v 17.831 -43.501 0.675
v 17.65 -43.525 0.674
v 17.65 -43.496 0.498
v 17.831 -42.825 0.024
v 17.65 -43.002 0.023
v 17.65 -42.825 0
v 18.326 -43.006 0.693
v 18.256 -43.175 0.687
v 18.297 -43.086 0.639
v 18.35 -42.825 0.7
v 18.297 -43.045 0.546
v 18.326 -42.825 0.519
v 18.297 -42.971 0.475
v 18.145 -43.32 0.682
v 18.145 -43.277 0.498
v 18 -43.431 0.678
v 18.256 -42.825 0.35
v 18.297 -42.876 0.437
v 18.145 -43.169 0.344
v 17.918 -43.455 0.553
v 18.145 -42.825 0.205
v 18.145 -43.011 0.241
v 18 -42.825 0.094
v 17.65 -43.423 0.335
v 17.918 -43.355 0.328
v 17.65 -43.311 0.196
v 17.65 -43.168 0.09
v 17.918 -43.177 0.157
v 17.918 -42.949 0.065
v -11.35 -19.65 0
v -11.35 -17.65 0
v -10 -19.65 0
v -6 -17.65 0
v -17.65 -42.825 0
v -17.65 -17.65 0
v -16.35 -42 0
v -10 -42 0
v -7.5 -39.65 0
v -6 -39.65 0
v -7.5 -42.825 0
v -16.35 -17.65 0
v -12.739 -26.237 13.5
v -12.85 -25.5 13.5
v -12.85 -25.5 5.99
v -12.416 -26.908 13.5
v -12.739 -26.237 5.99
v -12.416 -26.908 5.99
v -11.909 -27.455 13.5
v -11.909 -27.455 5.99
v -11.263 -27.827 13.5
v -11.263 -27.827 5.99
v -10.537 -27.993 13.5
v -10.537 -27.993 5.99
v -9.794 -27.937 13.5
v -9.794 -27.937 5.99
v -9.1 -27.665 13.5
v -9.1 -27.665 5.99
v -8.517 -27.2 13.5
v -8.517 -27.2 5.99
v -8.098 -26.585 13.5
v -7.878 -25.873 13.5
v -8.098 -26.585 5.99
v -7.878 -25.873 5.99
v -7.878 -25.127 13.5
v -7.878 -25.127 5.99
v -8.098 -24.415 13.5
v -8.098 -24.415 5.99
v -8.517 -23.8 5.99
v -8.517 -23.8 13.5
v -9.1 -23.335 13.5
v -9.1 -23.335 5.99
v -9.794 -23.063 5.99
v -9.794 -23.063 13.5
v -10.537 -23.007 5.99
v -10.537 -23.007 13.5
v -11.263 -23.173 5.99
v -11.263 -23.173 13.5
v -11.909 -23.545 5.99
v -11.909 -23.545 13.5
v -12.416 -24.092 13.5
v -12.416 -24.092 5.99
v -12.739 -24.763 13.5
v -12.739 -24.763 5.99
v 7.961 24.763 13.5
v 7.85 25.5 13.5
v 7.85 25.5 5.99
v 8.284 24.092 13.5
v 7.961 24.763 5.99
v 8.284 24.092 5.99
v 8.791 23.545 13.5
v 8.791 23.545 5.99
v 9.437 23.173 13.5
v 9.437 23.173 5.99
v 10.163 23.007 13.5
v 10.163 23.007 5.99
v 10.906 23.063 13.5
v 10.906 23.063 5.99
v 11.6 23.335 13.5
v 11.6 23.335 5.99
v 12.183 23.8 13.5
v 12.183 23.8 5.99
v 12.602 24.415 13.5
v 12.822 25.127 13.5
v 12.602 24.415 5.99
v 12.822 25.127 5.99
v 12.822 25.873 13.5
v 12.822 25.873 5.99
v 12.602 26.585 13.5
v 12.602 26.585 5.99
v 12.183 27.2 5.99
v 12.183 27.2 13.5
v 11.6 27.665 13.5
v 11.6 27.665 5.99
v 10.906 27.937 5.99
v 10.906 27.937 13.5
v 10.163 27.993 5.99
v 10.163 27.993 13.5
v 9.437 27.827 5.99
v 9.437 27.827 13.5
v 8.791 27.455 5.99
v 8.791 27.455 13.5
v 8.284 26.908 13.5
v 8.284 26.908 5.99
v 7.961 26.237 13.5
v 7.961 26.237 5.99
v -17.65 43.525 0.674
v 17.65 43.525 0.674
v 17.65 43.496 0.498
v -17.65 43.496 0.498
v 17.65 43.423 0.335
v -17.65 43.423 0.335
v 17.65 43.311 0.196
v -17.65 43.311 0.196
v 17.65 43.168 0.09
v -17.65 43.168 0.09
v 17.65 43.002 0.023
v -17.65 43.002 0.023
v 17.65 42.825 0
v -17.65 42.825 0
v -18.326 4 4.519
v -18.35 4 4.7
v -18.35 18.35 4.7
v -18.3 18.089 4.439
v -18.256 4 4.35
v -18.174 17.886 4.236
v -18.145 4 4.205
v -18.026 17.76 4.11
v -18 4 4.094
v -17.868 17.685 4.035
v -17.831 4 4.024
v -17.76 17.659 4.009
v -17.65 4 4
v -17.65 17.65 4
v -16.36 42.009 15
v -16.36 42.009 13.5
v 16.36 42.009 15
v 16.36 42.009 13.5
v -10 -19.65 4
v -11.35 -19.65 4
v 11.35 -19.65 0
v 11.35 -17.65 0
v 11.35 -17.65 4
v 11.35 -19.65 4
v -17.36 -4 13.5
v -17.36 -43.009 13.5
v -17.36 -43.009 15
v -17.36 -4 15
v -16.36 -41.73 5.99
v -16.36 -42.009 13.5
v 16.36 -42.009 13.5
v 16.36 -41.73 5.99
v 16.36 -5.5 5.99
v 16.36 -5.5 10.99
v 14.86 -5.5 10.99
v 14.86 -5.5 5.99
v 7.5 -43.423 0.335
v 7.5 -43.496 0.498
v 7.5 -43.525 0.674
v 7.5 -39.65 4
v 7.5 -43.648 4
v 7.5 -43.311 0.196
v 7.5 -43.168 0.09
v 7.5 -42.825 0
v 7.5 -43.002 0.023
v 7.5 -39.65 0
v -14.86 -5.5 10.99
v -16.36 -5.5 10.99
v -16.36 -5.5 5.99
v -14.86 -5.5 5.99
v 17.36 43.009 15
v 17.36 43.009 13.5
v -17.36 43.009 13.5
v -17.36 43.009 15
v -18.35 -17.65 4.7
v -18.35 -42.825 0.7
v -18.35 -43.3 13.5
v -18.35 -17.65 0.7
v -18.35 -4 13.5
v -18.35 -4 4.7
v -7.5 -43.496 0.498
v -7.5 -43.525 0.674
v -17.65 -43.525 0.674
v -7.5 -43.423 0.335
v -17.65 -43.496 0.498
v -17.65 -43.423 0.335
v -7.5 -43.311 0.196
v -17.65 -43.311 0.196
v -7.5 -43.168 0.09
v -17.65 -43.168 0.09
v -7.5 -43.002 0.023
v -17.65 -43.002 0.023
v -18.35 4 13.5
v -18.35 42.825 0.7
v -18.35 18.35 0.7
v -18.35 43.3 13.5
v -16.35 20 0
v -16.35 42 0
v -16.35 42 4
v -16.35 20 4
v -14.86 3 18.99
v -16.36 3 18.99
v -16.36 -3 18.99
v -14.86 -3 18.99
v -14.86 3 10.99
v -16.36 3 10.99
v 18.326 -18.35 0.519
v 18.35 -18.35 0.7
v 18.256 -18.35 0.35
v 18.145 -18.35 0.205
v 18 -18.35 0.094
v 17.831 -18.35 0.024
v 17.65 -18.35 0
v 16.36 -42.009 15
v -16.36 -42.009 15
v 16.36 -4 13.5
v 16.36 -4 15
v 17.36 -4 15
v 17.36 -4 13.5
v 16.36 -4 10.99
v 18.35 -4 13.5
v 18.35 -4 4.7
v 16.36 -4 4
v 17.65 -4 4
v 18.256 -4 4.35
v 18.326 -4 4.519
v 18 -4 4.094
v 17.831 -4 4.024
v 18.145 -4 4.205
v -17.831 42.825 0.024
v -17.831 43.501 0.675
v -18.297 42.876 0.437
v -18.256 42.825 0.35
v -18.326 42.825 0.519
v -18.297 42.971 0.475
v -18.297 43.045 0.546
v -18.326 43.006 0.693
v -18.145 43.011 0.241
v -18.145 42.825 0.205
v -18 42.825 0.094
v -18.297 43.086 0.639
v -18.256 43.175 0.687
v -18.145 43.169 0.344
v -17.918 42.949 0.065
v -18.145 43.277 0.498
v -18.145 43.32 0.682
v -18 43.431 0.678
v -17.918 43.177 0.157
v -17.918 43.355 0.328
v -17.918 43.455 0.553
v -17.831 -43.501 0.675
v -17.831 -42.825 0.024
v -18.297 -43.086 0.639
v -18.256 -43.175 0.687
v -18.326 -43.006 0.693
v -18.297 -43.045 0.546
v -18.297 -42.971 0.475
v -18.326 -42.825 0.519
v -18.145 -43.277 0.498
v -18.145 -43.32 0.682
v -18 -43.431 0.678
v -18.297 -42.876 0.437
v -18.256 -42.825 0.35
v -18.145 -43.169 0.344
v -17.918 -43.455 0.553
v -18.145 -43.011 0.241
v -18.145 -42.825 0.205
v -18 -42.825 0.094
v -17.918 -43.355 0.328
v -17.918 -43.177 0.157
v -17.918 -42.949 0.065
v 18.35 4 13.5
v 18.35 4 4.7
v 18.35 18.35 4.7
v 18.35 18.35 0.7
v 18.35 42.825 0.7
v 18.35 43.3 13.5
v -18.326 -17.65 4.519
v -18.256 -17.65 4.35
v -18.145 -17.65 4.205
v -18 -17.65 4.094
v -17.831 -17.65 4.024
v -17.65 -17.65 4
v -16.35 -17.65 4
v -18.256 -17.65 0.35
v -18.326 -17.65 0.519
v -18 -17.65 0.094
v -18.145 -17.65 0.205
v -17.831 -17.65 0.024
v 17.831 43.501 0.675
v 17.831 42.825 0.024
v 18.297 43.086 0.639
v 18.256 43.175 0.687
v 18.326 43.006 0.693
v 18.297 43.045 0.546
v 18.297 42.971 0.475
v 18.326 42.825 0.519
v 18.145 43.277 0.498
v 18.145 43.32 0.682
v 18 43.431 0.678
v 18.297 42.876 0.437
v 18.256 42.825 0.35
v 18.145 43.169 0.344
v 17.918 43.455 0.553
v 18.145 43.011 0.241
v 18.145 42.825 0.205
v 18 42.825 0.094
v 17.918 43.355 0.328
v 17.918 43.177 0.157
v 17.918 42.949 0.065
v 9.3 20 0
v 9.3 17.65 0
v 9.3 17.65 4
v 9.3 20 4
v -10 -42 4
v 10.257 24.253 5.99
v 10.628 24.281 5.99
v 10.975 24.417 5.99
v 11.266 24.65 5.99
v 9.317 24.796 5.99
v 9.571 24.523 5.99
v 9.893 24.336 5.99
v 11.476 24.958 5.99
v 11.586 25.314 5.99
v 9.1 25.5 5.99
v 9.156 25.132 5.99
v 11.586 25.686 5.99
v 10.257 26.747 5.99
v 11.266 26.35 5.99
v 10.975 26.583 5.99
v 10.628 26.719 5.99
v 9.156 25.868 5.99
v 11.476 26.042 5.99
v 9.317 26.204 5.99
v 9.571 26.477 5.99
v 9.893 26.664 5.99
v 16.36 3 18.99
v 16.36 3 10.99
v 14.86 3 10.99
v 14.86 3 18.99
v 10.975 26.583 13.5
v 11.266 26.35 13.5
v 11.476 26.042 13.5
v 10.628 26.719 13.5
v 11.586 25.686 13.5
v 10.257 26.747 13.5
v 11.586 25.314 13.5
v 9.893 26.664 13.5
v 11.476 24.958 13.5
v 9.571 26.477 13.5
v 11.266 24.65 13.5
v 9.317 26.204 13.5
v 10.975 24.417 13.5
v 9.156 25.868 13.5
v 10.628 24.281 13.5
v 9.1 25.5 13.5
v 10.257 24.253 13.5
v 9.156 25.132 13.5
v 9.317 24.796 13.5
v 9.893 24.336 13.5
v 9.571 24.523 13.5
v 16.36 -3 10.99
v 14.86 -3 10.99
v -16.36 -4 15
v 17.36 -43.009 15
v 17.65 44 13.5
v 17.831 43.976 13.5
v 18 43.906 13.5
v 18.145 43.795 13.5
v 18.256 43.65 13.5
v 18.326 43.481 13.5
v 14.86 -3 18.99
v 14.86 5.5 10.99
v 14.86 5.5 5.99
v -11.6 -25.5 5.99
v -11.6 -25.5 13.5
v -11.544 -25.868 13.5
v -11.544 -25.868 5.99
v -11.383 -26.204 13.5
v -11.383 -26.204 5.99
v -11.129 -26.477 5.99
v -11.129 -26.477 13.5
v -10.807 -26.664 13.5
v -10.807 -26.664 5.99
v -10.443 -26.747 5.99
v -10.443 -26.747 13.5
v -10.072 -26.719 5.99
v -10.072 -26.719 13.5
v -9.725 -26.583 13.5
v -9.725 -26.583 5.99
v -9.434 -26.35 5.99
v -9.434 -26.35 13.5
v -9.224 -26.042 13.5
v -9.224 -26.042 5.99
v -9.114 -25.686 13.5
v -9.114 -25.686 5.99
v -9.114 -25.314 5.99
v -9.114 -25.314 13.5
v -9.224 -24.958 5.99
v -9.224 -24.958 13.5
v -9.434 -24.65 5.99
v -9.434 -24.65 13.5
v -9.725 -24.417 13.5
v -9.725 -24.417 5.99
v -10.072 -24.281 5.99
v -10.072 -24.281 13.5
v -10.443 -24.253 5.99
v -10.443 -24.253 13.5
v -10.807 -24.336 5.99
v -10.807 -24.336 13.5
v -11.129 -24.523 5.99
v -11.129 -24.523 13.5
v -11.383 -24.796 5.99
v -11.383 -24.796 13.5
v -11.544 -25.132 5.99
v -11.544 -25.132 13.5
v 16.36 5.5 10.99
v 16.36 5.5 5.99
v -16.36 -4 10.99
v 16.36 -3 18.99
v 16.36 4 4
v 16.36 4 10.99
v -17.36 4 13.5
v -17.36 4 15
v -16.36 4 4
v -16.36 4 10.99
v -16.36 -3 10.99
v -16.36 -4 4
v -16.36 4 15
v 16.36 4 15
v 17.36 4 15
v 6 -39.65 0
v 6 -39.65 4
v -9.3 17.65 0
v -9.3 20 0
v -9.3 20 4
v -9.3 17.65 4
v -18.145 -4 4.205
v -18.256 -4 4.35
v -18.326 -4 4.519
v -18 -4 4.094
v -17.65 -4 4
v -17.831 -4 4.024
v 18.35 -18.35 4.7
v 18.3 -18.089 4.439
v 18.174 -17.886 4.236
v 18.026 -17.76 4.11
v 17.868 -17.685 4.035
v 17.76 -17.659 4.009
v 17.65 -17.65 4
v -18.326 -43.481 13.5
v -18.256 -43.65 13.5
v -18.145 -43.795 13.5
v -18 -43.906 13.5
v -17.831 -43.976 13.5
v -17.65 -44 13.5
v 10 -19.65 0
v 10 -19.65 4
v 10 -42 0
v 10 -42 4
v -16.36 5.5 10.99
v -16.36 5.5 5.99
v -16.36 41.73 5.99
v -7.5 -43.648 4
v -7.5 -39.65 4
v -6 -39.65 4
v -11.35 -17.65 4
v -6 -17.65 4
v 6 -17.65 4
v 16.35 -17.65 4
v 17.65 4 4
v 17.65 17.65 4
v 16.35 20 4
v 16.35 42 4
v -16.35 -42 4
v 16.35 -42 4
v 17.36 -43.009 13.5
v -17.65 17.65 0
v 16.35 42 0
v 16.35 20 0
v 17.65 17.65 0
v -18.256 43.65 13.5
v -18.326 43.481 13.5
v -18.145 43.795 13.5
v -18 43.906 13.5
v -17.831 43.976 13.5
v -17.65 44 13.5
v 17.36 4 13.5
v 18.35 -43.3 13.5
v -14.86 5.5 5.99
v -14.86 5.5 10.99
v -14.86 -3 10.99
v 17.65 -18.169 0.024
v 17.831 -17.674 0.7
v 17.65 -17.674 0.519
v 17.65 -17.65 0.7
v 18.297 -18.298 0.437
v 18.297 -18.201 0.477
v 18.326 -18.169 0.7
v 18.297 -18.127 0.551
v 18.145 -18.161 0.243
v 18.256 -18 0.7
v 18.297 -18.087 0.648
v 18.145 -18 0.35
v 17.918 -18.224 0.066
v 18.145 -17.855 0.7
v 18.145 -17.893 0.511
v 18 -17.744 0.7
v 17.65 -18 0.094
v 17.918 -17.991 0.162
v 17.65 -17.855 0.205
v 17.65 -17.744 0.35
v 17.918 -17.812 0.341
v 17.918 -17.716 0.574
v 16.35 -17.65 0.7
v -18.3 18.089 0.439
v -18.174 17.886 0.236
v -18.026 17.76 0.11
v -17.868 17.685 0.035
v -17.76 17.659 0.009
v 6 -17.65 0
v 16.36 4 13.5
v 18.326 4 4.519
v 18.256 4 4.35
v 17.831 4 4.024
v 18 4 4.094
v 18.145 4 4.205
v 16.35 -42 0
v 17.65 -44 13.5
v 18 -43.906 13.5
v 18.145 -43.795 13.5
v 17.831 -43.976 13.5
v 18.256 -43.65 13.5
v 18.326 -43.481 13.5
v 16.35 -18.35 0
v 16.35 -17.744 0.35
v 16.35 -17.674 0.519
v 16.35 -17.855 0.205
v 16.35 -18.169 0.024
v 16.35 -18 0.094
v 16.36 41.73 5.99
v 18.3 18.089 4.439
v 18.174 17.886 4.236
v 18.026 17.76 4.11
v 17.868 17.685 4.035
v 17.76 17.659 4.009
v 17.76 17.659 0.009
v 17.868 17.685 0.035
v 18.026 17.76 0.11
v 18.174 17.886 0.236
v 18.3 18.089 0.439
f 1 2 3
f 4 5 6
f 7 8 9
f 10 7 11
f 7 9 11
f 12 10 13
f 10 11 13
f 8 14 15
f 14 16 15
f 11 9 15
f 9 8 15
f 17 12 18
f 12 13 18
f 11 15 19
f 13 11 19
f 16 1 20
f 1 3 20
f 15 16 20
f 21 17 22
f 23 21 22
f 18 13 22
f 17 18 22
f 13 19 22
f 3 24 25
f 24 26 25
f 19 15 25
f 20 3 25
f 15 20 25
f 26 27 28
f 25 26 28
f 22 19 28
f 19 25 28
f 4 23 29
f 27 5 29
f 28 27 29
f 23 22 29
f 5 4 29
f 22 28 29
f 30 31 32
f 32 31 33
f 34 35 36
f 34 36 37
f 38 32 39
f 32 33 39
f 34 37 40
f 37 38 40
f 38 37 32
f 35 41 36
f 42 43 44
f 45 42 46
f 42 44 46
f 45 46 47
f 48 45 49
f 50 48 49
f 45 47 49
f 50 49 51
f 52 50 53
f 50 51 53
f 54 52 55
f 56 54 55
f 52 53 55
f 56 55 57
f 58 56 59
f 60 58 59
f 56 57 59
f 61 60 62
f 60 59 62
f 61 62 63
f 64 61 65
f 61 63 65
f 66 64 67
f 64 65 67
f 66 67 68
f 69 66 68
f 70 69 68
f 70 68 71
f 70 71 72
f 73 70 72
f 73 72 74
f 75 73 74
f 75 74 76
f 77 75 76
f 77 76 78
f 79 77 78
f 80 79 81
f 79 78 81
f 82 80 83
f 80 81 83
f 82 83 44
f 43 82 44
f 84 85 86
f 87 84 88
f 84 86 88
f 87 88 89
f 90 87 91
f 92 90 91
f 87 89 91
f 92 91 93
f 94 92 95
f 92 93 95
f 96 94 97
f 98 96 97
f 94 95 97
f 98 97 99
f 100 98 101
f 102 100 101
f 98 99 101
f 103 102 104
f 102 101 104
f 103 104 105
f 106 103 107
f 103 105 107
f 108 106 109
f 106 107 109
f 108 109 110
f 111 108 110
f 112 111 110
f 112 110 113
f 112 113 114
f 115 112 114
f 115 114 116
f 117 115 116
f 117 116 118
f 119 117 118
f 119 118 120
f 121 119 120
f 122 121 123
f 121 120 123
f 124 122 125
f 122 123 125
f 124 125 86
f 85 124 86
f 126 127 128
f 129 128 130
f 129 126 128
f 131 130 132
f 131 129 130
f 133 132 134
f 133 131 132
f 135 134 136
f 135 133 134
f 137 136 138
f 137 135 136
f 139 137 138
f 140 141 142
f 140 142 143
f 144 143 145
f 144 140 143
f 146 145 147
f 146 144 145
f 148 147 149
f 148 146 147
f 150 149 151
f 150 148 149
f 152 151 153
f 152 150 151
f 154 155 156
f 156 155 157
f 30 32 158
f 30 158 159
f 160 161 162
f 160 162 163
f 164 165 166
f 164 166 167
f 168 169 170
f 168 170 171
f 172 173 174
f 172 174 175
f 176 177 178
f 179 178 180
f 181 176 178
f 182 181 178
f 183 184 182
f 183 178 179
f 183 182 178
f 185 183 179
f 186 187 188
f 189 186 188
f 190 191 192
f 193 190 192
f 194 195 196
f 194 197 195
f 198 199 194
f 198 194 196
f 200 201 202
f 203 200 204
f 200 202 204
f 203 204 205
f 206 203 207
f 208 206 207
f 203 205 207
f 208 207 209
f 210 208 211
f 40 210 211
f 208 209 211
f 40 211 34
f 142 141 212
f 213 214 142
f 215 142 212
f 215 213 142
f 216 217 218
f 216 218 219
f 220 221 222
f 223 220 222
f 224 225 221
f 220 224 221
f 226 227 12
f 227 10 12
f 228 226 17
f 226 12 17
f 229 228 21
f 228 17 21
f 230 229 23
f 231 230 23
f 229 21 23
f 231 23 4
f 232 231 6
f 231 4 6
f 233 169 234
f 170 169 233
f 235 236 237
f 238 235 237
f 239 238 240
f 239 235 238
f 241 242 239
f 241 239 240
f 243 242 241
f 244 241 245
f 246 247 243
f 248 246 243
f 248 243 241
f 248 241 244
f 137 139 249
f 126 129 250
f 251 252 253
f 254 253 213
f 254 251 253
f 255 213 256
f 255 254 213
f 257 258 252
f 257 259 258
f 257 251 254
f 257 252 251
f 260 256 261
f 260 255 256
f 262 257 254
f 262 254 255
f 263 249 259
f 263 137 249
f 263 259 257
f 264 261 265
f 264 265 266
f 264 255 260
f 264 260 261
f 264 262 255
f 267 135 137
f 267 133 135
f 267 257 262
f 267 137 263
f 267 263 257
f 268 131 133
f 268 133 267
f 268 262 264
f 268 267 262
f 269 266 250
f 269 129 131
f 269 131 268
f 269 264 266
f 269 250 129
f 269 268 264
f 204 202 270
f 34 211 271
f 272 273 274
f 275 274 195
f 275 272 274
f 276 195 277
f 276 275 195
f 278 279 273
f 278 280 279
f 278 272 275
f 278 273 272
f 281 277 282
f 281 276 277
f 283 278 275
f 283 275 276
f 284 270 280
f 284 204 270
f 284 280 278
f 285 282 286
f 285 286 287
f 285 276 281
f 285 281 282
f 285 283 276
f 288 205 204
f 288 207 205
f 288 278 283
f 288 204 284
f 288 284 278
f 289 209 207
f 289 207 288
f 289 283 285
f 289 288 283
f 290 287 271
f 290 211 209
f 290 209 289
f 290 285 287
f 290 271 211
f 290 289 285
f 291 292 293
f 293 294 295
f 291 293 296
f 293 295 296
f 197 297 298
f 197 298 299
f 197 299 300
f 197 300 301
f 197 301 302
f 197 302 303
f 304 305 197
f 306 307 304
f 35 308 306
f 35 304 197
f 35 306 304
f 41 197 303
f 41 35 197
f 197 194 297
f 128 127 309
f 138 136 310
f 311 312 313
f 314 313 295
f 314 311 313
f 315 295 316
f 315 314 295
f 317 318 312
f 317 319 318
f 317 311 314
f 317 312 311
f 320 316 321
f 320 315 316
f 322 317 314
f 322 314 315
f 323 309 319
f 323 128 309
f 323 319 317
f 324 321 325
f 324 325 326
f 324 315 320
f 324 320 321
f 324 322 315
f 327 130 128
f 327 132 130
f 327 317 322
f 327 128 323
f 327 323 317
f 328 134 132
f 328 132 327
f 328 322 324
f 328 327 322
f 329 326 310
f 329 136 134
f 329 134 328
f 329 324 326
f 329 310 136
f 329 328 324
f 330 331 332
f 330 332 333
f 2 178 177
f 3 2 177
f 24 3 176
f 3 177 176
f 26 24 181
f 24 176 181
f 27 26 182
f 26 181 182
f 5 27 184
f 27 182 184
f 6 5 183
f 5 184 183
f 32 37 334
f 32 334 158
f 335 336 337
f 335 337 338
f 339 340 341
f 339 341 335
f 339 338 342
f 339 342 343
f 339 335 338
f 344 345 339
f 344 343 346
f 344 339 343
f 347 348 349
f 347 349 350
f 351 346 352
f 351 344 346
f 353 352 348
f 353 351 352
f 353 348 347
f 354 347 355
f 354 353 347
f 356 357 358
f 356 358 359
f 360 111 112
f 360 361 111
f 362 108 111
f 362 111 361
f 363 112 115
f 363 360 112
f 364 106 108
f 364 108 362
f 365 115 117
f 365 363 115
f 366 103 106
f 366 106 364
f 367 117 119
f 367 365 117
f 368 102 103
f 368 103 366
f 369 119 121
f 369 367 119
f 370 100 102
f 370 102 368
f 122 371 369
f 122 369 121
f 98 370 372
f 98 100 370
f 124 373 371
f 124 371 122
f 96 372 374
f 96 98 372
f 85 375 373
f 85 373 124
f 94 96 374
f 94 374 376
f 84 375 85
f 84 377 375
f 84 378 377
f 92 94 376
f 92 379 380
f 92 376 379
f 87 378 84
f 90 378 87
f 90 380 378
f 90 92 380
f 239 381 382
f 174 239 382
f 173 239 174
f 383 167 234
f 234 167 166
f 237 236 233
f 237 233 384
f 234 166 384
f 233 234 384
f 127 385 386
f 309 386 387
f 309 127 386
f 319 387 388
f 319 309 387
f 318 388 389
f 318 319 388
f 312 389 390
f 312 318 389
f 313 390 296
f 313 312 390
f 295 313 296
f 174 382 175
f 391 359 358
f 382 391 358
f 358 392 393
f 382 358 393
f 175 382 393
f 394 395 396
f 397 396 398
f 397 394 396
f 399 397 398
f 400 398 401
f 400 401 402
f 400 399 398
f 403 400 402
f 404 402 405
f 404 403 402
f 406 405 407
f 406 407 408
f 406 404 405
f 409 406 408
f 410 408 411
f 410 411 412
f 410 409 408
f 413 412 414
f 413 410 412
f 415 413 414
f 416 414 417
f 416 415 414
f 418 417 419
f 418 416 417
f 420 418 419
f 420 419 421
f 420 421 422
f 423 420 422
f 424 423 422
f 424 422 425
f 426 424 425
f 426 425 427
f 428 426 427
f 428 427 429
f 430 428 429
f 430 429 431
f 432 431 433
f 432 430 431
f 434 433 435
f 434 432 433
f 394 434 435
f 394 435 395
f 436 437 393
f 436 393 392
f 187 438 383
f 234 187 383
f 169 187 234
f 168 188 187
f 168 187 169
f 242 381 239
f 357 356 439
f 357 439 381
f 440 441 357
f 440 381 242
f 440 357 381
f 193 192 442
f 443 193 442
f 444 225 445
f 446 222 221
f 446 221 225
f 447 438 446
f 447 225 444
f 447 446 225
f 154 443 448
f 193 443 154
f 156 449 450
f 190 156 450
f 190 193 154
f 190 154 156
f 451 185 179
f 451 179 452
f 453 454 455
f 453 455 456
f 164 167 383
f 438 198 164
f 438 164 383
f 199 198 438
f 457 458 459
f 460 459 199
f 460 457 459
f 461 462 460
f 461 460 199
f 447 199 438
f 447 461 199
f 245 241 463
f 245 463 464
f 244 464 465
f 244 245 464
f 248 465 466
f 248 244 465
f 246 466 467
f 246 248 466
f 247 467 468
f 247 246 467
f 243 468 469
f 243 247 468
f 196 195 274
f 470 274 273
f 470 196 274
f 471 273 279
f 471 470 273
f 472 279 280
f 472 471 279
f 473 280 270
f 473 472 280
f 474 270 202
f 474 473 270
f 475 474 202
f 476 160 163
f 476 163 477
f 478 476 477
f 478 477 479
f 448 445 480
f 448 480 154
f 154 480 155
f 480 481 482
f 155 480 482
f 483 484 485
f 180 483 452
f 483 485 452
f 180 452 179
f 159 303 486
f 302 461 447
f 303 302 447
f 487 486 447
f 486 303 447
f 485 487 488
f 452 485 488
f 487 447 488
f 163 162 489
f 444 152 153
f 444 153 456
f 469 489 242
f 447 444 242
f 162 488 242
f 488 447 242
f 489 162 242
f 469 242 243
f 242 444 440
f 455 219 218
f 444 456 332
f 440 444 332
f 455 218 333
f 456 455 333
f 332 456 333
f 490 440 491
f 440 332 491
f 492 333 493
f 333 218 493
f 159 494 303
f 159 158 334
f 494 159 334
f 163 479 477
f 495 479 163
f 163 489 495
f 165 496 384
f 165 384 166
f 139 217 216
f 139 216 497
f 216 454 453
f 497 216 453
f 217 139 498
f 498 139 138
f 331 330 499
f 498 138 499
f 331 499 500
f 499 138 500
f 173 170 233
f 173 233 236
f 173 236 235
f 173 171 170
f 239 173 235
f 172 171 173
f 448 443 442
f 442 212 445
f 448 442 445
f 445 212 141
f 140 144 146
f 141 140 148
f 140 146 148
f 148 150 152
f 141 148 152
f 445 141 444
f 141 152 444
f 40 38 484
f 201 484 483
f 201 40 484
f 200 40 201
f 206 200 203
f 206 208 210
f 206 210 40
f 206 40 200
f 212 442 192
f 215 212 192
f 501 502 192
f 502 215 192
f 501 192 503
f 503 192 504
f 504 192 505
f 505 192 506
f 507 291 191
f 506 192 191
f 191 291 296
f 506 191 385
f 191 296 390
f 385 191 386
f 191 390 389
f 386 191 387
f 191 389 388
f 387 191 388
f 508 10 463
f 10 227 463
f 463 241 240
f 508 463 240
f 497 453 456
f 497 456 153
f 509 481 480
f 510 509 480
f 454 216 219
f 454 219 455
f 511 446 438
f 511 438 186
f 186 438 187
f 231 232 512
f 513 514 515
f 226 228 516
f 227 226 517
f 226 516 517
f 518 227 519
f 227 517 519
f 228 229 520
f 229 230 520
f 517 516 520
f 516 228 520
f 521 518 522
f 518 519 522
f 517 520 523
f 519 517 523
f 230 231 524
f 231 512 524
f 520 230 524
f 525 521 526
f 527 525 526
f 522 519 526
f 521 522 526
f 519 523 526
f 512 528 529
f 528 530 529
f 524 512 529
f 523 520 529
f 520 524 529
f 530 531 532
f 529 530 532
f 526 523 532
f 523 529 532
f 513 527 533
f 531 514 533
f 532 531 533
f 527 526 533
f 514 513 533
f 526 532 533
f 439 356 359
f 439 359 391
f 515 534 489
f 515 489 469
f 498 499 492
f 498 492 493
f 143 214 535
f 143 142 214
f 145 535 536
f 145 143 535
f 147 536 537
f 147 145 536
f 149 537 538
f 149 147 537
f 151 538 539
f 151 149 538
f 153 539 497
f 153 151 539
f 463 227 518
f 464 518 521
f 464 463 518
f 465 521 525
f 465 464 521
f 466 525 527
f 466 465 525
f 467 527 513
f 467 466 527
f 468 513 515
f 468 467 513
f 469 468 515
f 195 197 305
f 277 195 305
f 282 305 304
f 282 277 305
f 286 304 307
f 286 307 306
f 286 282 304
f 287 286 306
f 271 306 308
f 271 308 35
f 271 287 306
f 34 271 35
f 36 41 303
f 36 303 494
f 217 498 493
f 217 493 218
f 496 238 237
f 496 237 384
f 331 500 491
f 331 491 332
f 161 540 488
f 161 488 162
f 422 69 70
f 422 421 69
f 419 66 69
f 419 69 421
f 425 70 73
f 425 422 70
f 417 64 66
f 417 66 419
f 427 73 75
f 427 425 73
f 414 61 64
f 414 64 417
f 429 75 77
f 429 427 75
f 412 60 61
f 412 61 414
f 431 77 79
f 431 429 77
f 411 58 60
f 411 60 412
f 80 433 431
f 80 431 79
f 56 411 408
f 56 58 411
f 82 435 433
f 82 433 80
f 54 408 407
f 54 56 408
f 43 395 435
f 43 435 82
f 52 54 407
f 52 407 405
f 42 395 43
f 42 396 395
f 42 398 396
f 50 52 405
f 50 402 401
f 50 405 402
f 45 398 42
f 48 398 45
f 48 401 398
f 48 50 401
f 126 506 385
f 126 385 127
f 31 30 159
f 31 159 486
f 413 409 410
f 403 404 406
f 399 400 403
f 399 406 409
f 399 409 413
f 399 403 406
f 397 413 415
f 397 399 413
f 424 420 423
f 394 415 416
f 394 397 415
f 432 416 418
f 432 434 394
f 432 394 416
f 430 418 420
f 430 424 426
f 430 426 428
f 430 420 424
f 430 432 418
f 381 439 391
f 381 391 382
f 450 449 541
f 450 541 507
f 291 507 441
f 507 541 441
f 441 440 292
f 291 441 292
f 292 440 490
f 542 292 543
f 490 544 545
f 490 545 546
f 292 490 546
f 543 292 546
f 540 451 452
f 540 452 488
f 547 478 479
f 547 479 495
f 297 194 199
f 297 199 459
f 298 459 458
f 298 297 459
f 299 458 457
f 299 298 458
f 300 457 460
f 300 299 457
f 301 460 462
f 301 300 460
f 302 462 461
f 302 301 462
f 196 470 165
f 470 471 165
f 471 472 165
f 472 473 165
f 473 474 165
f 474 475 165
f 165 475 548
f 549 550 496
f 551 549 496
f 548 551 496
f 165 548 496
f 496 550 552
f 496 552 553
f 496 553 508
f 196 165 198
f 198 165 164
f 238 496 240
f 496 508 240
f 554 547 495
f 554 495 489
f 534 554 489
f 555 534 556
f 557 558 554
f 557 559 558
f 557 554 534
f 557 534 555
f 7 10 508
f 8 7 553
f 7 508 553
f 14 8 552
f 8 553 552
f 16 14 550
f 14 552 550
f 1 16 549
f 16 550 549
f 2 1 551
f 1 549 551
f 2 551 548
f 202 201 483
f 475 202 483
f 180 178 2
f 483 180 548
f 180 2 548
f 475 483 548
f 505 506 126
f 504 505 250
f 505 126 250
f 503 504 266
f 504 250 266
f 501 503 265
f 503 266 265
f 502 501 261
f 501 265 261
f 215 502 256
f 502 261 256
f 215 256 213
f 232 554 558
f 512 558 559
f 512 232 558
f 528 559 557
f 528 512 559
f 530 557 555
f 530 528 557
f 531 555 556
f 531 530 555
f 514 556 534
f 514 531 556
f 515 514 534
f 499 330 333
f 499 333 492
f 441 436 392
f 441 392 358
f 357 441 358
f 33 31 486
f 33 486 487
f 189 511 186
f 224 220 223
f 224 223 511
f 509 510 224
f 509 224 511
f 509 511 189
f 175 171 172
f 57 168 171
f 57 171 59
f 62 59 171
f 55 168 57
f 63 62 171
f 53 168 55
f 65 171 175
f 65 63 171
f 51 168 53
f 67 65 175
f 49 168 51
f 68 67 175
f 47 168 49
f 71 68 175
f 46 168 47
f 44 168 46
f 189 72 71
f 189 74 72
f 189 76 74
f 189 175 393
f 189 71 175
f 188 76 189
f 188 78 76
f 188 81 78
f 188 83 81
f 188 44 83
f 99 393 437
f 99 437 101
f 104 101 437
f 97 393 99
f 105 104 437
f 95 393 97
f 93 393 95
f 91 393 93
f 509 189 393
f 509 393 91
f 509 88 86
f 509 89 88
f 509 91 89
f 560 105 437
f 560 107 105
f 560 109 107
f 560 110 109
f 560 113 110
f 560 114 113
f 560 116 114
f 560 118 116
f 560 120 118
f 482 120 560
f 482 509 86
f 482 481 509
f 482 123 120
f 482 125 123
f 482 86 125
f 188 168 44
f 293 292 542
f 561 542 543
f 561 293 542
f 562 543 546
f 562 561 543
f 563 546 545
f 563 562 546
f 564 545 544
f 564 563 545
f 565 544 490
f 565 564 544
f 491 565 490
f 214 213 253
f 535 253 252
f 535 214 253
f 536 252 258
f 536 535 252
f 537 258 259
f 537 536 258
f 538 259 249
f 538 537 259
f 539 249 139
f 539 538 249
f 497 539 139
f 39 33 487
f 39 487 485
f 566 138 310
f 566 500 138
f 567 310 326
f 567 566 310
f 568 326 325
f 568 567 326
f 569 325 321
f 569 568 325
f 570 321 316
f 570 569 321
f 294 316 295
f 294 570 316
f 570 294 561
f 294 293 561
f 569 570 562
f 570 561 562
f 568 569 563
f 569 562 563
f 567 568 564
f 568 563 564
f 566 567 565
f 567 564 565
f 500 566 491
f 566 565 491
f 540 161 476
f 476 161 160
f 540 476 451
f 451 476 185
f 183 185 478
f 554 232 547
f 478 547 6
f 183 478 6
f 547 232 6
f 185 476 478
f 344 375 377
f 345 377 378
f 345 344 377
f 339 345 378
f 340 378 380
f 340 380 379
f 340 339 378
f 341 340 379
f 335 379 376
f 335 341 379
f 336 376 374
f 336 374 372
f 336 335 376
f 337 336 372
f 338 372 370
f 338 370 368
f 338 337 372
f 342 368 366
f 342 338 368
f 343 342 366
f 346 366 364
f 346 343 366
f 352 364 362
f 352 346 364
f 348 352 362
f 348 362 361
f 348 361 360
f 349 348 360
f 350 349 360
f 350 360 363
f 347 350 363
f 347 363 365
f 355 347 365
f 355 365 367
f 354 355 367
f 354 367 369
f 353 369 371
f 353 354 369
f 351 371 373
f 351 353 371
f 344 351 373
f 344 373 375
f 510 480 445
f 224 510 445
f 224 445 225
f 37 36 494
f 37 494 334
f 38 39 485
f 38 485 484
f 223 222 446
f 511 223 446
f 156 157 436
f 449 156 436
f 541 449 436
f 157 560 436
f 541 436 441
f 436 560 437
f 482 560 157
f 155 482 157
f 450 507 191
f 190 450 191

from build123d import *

# Parameters (mm, degrees)
EXTRUDE_1_DEPTH     = 18.35
CUT_EXTRUDE_1_DEPTH = 4
SHELL_START         = -16.36
SHELL_1_DEPTH       = 32.72
SKETCH_8_R          = 2.5
SKETCH_8_R_2        = 1.25
EXTRUDE_4_DEPTH     = 7.51
FILLET_1_R          = 0.7
SKETCH_10_W         = 8.837744534
SKETCH_10_H         = 38.466628308
SKETCH_10_W_2       = 9.721518987
SKETCH_10_H_2       = 38.024741082
CUT_EXTRUDE_2_DEPTH = 4
EXTRUDE_5_DEPTH     = 1.5
EXTRUDE_6_DEPTH     = 1.5


# Read off the part's stored shape, not the designer's step: Оболочка1
with BuildPart() as part:
    # Эскиз1 → Вытянуть1 (new, symmetric)
    with BuildSketch(Plane(origin=(0, 0, 0), x_dir=(0, 0, -1), z_dir=(1, 0, 0))):
        Polygon((-13.5, 44), (0, 43.5), (0, -43.5), (-13.5, -44), align=None)
    extrude(amount=EXTRUDE_1_DEPTH, both=True)

    # Эскиз2 → Вырез-Вытянуть1 (cut)
    with BuildSketch(Plane(origin=(0, 0, 0), x_dir=(-1, 0, 0), z_dir=(0, 0, -1))):
        Polygon((-18.35, 17.65), (-9.3, 17.65), (-9.3, 20), (-16.35, 20), (-16.35, 42), (16.35, 42), (16.35, 20), (9.3, 20), (9.3, 17.65), (18.35, 17.65), (18.35, -17.65), (16.35, -17.65), (16.35, -42), (10, -42), (10, -19.65), (11.35, -19.65), (11.35, -17.65), (6, -17.65), (6, -39.65), (7.5, -39.65), (7.5, -44), (-7.5, -44), (-7.5, -39.65), (-6, -39.65), (-6, -17.65), (-11.35, -17.65), (-11.35, -19.65), (-10, -19.65), (-10, -42), (-16.35, -42), (-16.35, -17.65), (-18.35, -17.65), align=None)
    extrude(amount=-CUT_EXTRUDE_1_DEPTH, mode=Mode.SUBTRACT)

    # Оболочка1 outline → Оболочка1 (cut)
    with BuildSketch(Plane.YZ.offset(SHELL_START)):
        Polygon((-42.008635584, 13.5), (-41.730487436, 5.99), (41.730487436, 5.99), (42.008635584, 13.5), align=None)
    extrude(amount=SHELL_1_DEPTH, mode=Mode.SUBTRACT)

    # Эскиз8 → Вытянуть4 (add)
    # profile 1 of 2: a face of its own
    with BuildSketch(Plane.XY.offset(5.99)):
        with Locations(Location((10.35, 25.5, 0), (0, 0, 180))):
            Circle(SKETCH_8_R)
        with Locations(Location((10.35, 25.5, 0), (0, 0, 180))):
            Circle(SKETCH_8_R_2, mode=Mode.SUBTRACT)
    # profile 2 of 2: a face of its own
    with BuildSketch(Plane.XY.offset(5.99)):
        with Locations(Location((-10.35, -25.5, 0), (0, 0, 180))):
            Circle(SKETCH_8_R)
        with Locations(Location((-10.35, -25.5, 0), (0, 0, 180))):
            Circle(SKETCH_8_R_2, mode=Mode.SUBTRACT)
    extrude(amount=EXTRUDE_4_DEPTH)

    # Скругление1
    fillet_1_edges = [part.edges().sort_by_distance(p)[0] for p in [
        (17.35, -17.65, 0),
        (-18.35, -43.75, 6.75),
        (-18.35, -30.575, 0),
        (-18.35, 0, 4),
        (-18.35, 30.575, 0),
        (18.35, -43.75, 6.75),
        (18.35, -30.575, 0),
        (18.35, -17.65, 2),
        (18.35, 0, 4),
        (18.35, 17.65, 2),
        (18.35, 30.575, 0),
        (-18.35, 43.75, 6.75),
        (0, 43.5, 0),
        (18.35, 43.75, 6.75),
        (-12.925, -43.5, 0),
        (12.925, -43.5, 0),
        (-18.35, 17.65, 2),
    ]]
    fillet(fillet_1_edges, radius=FILLET_1_R)

    # Эскиз10 → Вырез-Вытянуть2 (cut, symmetric)
    with BuildSketch(Plane(origin=(0, 0, 0), x_dir=(1, 0, 0), z_dir=(0, 1, 0))):
        with Locations((-20.778872267, 0)):
            Rectangle(SKETCH_10_W, SKETCH_10_H)
        with Locations((21.220759494, 0)):
            Rectangle(SKETCH_10_W_2, SKETCH_10_H_2)
    extrude(amount=CUT_EXTRUDE_2_DEPTH, both=True, mode=Mode.SUBTRACT)


with BuildPart() as body_2:
    # Эскиз11 → Вытянуть5 (new body)
    with BuildSketch(Plane(origin=(-16.36, 0, 0), x_dir=(0, 0, -1), z_dir=(1, 0, 0))):
        Polygon((-5.99, 5.5), (-10.99, 5.5), (-10.99, 3), (-18.99, 3), (-18.99, -3), (-10.99, -3), (-10.99, -5.5), (-5.99, -5.5), align=None)
    extrude_5 = extrude(amount=EXTRUDE_5_DEPTH)



with BuildPart() as part_1:
    add(part.part)

    # Зеркальное отражение2: Вытянуть5 across plane
    add(extrude_5.mirror(Plane(origin=(0, 0, 0), x_dir=(0, 0, 1), z_dir=(1, 0, 0))))


with BuildPart() as body_2_1:
    add(body_2.part)

    add(part_1.part)  # Вытянуть6 merges part
    # Эскиз12 → Вытянуть6 (add)
    with BuildSketch(Plane.XY.offset(13.5)):
        Polygon((-16.36, 4), (-16.36, 42.008635584), (16.36, 42.008635584), (16.36, 4), (17.36, 4), (17.36, 43.008635584), (-17.36, 43.008635584), (-17.36, 4), align=None)
    extrude_6 = extrude(amount=EXTRUDE_6_DEPTH)

    # Зеркальное отражение3: Вытянуть6 across plane
    add(extrude_6.mirror(Plane.ZX))


solid = body_2_1.part
